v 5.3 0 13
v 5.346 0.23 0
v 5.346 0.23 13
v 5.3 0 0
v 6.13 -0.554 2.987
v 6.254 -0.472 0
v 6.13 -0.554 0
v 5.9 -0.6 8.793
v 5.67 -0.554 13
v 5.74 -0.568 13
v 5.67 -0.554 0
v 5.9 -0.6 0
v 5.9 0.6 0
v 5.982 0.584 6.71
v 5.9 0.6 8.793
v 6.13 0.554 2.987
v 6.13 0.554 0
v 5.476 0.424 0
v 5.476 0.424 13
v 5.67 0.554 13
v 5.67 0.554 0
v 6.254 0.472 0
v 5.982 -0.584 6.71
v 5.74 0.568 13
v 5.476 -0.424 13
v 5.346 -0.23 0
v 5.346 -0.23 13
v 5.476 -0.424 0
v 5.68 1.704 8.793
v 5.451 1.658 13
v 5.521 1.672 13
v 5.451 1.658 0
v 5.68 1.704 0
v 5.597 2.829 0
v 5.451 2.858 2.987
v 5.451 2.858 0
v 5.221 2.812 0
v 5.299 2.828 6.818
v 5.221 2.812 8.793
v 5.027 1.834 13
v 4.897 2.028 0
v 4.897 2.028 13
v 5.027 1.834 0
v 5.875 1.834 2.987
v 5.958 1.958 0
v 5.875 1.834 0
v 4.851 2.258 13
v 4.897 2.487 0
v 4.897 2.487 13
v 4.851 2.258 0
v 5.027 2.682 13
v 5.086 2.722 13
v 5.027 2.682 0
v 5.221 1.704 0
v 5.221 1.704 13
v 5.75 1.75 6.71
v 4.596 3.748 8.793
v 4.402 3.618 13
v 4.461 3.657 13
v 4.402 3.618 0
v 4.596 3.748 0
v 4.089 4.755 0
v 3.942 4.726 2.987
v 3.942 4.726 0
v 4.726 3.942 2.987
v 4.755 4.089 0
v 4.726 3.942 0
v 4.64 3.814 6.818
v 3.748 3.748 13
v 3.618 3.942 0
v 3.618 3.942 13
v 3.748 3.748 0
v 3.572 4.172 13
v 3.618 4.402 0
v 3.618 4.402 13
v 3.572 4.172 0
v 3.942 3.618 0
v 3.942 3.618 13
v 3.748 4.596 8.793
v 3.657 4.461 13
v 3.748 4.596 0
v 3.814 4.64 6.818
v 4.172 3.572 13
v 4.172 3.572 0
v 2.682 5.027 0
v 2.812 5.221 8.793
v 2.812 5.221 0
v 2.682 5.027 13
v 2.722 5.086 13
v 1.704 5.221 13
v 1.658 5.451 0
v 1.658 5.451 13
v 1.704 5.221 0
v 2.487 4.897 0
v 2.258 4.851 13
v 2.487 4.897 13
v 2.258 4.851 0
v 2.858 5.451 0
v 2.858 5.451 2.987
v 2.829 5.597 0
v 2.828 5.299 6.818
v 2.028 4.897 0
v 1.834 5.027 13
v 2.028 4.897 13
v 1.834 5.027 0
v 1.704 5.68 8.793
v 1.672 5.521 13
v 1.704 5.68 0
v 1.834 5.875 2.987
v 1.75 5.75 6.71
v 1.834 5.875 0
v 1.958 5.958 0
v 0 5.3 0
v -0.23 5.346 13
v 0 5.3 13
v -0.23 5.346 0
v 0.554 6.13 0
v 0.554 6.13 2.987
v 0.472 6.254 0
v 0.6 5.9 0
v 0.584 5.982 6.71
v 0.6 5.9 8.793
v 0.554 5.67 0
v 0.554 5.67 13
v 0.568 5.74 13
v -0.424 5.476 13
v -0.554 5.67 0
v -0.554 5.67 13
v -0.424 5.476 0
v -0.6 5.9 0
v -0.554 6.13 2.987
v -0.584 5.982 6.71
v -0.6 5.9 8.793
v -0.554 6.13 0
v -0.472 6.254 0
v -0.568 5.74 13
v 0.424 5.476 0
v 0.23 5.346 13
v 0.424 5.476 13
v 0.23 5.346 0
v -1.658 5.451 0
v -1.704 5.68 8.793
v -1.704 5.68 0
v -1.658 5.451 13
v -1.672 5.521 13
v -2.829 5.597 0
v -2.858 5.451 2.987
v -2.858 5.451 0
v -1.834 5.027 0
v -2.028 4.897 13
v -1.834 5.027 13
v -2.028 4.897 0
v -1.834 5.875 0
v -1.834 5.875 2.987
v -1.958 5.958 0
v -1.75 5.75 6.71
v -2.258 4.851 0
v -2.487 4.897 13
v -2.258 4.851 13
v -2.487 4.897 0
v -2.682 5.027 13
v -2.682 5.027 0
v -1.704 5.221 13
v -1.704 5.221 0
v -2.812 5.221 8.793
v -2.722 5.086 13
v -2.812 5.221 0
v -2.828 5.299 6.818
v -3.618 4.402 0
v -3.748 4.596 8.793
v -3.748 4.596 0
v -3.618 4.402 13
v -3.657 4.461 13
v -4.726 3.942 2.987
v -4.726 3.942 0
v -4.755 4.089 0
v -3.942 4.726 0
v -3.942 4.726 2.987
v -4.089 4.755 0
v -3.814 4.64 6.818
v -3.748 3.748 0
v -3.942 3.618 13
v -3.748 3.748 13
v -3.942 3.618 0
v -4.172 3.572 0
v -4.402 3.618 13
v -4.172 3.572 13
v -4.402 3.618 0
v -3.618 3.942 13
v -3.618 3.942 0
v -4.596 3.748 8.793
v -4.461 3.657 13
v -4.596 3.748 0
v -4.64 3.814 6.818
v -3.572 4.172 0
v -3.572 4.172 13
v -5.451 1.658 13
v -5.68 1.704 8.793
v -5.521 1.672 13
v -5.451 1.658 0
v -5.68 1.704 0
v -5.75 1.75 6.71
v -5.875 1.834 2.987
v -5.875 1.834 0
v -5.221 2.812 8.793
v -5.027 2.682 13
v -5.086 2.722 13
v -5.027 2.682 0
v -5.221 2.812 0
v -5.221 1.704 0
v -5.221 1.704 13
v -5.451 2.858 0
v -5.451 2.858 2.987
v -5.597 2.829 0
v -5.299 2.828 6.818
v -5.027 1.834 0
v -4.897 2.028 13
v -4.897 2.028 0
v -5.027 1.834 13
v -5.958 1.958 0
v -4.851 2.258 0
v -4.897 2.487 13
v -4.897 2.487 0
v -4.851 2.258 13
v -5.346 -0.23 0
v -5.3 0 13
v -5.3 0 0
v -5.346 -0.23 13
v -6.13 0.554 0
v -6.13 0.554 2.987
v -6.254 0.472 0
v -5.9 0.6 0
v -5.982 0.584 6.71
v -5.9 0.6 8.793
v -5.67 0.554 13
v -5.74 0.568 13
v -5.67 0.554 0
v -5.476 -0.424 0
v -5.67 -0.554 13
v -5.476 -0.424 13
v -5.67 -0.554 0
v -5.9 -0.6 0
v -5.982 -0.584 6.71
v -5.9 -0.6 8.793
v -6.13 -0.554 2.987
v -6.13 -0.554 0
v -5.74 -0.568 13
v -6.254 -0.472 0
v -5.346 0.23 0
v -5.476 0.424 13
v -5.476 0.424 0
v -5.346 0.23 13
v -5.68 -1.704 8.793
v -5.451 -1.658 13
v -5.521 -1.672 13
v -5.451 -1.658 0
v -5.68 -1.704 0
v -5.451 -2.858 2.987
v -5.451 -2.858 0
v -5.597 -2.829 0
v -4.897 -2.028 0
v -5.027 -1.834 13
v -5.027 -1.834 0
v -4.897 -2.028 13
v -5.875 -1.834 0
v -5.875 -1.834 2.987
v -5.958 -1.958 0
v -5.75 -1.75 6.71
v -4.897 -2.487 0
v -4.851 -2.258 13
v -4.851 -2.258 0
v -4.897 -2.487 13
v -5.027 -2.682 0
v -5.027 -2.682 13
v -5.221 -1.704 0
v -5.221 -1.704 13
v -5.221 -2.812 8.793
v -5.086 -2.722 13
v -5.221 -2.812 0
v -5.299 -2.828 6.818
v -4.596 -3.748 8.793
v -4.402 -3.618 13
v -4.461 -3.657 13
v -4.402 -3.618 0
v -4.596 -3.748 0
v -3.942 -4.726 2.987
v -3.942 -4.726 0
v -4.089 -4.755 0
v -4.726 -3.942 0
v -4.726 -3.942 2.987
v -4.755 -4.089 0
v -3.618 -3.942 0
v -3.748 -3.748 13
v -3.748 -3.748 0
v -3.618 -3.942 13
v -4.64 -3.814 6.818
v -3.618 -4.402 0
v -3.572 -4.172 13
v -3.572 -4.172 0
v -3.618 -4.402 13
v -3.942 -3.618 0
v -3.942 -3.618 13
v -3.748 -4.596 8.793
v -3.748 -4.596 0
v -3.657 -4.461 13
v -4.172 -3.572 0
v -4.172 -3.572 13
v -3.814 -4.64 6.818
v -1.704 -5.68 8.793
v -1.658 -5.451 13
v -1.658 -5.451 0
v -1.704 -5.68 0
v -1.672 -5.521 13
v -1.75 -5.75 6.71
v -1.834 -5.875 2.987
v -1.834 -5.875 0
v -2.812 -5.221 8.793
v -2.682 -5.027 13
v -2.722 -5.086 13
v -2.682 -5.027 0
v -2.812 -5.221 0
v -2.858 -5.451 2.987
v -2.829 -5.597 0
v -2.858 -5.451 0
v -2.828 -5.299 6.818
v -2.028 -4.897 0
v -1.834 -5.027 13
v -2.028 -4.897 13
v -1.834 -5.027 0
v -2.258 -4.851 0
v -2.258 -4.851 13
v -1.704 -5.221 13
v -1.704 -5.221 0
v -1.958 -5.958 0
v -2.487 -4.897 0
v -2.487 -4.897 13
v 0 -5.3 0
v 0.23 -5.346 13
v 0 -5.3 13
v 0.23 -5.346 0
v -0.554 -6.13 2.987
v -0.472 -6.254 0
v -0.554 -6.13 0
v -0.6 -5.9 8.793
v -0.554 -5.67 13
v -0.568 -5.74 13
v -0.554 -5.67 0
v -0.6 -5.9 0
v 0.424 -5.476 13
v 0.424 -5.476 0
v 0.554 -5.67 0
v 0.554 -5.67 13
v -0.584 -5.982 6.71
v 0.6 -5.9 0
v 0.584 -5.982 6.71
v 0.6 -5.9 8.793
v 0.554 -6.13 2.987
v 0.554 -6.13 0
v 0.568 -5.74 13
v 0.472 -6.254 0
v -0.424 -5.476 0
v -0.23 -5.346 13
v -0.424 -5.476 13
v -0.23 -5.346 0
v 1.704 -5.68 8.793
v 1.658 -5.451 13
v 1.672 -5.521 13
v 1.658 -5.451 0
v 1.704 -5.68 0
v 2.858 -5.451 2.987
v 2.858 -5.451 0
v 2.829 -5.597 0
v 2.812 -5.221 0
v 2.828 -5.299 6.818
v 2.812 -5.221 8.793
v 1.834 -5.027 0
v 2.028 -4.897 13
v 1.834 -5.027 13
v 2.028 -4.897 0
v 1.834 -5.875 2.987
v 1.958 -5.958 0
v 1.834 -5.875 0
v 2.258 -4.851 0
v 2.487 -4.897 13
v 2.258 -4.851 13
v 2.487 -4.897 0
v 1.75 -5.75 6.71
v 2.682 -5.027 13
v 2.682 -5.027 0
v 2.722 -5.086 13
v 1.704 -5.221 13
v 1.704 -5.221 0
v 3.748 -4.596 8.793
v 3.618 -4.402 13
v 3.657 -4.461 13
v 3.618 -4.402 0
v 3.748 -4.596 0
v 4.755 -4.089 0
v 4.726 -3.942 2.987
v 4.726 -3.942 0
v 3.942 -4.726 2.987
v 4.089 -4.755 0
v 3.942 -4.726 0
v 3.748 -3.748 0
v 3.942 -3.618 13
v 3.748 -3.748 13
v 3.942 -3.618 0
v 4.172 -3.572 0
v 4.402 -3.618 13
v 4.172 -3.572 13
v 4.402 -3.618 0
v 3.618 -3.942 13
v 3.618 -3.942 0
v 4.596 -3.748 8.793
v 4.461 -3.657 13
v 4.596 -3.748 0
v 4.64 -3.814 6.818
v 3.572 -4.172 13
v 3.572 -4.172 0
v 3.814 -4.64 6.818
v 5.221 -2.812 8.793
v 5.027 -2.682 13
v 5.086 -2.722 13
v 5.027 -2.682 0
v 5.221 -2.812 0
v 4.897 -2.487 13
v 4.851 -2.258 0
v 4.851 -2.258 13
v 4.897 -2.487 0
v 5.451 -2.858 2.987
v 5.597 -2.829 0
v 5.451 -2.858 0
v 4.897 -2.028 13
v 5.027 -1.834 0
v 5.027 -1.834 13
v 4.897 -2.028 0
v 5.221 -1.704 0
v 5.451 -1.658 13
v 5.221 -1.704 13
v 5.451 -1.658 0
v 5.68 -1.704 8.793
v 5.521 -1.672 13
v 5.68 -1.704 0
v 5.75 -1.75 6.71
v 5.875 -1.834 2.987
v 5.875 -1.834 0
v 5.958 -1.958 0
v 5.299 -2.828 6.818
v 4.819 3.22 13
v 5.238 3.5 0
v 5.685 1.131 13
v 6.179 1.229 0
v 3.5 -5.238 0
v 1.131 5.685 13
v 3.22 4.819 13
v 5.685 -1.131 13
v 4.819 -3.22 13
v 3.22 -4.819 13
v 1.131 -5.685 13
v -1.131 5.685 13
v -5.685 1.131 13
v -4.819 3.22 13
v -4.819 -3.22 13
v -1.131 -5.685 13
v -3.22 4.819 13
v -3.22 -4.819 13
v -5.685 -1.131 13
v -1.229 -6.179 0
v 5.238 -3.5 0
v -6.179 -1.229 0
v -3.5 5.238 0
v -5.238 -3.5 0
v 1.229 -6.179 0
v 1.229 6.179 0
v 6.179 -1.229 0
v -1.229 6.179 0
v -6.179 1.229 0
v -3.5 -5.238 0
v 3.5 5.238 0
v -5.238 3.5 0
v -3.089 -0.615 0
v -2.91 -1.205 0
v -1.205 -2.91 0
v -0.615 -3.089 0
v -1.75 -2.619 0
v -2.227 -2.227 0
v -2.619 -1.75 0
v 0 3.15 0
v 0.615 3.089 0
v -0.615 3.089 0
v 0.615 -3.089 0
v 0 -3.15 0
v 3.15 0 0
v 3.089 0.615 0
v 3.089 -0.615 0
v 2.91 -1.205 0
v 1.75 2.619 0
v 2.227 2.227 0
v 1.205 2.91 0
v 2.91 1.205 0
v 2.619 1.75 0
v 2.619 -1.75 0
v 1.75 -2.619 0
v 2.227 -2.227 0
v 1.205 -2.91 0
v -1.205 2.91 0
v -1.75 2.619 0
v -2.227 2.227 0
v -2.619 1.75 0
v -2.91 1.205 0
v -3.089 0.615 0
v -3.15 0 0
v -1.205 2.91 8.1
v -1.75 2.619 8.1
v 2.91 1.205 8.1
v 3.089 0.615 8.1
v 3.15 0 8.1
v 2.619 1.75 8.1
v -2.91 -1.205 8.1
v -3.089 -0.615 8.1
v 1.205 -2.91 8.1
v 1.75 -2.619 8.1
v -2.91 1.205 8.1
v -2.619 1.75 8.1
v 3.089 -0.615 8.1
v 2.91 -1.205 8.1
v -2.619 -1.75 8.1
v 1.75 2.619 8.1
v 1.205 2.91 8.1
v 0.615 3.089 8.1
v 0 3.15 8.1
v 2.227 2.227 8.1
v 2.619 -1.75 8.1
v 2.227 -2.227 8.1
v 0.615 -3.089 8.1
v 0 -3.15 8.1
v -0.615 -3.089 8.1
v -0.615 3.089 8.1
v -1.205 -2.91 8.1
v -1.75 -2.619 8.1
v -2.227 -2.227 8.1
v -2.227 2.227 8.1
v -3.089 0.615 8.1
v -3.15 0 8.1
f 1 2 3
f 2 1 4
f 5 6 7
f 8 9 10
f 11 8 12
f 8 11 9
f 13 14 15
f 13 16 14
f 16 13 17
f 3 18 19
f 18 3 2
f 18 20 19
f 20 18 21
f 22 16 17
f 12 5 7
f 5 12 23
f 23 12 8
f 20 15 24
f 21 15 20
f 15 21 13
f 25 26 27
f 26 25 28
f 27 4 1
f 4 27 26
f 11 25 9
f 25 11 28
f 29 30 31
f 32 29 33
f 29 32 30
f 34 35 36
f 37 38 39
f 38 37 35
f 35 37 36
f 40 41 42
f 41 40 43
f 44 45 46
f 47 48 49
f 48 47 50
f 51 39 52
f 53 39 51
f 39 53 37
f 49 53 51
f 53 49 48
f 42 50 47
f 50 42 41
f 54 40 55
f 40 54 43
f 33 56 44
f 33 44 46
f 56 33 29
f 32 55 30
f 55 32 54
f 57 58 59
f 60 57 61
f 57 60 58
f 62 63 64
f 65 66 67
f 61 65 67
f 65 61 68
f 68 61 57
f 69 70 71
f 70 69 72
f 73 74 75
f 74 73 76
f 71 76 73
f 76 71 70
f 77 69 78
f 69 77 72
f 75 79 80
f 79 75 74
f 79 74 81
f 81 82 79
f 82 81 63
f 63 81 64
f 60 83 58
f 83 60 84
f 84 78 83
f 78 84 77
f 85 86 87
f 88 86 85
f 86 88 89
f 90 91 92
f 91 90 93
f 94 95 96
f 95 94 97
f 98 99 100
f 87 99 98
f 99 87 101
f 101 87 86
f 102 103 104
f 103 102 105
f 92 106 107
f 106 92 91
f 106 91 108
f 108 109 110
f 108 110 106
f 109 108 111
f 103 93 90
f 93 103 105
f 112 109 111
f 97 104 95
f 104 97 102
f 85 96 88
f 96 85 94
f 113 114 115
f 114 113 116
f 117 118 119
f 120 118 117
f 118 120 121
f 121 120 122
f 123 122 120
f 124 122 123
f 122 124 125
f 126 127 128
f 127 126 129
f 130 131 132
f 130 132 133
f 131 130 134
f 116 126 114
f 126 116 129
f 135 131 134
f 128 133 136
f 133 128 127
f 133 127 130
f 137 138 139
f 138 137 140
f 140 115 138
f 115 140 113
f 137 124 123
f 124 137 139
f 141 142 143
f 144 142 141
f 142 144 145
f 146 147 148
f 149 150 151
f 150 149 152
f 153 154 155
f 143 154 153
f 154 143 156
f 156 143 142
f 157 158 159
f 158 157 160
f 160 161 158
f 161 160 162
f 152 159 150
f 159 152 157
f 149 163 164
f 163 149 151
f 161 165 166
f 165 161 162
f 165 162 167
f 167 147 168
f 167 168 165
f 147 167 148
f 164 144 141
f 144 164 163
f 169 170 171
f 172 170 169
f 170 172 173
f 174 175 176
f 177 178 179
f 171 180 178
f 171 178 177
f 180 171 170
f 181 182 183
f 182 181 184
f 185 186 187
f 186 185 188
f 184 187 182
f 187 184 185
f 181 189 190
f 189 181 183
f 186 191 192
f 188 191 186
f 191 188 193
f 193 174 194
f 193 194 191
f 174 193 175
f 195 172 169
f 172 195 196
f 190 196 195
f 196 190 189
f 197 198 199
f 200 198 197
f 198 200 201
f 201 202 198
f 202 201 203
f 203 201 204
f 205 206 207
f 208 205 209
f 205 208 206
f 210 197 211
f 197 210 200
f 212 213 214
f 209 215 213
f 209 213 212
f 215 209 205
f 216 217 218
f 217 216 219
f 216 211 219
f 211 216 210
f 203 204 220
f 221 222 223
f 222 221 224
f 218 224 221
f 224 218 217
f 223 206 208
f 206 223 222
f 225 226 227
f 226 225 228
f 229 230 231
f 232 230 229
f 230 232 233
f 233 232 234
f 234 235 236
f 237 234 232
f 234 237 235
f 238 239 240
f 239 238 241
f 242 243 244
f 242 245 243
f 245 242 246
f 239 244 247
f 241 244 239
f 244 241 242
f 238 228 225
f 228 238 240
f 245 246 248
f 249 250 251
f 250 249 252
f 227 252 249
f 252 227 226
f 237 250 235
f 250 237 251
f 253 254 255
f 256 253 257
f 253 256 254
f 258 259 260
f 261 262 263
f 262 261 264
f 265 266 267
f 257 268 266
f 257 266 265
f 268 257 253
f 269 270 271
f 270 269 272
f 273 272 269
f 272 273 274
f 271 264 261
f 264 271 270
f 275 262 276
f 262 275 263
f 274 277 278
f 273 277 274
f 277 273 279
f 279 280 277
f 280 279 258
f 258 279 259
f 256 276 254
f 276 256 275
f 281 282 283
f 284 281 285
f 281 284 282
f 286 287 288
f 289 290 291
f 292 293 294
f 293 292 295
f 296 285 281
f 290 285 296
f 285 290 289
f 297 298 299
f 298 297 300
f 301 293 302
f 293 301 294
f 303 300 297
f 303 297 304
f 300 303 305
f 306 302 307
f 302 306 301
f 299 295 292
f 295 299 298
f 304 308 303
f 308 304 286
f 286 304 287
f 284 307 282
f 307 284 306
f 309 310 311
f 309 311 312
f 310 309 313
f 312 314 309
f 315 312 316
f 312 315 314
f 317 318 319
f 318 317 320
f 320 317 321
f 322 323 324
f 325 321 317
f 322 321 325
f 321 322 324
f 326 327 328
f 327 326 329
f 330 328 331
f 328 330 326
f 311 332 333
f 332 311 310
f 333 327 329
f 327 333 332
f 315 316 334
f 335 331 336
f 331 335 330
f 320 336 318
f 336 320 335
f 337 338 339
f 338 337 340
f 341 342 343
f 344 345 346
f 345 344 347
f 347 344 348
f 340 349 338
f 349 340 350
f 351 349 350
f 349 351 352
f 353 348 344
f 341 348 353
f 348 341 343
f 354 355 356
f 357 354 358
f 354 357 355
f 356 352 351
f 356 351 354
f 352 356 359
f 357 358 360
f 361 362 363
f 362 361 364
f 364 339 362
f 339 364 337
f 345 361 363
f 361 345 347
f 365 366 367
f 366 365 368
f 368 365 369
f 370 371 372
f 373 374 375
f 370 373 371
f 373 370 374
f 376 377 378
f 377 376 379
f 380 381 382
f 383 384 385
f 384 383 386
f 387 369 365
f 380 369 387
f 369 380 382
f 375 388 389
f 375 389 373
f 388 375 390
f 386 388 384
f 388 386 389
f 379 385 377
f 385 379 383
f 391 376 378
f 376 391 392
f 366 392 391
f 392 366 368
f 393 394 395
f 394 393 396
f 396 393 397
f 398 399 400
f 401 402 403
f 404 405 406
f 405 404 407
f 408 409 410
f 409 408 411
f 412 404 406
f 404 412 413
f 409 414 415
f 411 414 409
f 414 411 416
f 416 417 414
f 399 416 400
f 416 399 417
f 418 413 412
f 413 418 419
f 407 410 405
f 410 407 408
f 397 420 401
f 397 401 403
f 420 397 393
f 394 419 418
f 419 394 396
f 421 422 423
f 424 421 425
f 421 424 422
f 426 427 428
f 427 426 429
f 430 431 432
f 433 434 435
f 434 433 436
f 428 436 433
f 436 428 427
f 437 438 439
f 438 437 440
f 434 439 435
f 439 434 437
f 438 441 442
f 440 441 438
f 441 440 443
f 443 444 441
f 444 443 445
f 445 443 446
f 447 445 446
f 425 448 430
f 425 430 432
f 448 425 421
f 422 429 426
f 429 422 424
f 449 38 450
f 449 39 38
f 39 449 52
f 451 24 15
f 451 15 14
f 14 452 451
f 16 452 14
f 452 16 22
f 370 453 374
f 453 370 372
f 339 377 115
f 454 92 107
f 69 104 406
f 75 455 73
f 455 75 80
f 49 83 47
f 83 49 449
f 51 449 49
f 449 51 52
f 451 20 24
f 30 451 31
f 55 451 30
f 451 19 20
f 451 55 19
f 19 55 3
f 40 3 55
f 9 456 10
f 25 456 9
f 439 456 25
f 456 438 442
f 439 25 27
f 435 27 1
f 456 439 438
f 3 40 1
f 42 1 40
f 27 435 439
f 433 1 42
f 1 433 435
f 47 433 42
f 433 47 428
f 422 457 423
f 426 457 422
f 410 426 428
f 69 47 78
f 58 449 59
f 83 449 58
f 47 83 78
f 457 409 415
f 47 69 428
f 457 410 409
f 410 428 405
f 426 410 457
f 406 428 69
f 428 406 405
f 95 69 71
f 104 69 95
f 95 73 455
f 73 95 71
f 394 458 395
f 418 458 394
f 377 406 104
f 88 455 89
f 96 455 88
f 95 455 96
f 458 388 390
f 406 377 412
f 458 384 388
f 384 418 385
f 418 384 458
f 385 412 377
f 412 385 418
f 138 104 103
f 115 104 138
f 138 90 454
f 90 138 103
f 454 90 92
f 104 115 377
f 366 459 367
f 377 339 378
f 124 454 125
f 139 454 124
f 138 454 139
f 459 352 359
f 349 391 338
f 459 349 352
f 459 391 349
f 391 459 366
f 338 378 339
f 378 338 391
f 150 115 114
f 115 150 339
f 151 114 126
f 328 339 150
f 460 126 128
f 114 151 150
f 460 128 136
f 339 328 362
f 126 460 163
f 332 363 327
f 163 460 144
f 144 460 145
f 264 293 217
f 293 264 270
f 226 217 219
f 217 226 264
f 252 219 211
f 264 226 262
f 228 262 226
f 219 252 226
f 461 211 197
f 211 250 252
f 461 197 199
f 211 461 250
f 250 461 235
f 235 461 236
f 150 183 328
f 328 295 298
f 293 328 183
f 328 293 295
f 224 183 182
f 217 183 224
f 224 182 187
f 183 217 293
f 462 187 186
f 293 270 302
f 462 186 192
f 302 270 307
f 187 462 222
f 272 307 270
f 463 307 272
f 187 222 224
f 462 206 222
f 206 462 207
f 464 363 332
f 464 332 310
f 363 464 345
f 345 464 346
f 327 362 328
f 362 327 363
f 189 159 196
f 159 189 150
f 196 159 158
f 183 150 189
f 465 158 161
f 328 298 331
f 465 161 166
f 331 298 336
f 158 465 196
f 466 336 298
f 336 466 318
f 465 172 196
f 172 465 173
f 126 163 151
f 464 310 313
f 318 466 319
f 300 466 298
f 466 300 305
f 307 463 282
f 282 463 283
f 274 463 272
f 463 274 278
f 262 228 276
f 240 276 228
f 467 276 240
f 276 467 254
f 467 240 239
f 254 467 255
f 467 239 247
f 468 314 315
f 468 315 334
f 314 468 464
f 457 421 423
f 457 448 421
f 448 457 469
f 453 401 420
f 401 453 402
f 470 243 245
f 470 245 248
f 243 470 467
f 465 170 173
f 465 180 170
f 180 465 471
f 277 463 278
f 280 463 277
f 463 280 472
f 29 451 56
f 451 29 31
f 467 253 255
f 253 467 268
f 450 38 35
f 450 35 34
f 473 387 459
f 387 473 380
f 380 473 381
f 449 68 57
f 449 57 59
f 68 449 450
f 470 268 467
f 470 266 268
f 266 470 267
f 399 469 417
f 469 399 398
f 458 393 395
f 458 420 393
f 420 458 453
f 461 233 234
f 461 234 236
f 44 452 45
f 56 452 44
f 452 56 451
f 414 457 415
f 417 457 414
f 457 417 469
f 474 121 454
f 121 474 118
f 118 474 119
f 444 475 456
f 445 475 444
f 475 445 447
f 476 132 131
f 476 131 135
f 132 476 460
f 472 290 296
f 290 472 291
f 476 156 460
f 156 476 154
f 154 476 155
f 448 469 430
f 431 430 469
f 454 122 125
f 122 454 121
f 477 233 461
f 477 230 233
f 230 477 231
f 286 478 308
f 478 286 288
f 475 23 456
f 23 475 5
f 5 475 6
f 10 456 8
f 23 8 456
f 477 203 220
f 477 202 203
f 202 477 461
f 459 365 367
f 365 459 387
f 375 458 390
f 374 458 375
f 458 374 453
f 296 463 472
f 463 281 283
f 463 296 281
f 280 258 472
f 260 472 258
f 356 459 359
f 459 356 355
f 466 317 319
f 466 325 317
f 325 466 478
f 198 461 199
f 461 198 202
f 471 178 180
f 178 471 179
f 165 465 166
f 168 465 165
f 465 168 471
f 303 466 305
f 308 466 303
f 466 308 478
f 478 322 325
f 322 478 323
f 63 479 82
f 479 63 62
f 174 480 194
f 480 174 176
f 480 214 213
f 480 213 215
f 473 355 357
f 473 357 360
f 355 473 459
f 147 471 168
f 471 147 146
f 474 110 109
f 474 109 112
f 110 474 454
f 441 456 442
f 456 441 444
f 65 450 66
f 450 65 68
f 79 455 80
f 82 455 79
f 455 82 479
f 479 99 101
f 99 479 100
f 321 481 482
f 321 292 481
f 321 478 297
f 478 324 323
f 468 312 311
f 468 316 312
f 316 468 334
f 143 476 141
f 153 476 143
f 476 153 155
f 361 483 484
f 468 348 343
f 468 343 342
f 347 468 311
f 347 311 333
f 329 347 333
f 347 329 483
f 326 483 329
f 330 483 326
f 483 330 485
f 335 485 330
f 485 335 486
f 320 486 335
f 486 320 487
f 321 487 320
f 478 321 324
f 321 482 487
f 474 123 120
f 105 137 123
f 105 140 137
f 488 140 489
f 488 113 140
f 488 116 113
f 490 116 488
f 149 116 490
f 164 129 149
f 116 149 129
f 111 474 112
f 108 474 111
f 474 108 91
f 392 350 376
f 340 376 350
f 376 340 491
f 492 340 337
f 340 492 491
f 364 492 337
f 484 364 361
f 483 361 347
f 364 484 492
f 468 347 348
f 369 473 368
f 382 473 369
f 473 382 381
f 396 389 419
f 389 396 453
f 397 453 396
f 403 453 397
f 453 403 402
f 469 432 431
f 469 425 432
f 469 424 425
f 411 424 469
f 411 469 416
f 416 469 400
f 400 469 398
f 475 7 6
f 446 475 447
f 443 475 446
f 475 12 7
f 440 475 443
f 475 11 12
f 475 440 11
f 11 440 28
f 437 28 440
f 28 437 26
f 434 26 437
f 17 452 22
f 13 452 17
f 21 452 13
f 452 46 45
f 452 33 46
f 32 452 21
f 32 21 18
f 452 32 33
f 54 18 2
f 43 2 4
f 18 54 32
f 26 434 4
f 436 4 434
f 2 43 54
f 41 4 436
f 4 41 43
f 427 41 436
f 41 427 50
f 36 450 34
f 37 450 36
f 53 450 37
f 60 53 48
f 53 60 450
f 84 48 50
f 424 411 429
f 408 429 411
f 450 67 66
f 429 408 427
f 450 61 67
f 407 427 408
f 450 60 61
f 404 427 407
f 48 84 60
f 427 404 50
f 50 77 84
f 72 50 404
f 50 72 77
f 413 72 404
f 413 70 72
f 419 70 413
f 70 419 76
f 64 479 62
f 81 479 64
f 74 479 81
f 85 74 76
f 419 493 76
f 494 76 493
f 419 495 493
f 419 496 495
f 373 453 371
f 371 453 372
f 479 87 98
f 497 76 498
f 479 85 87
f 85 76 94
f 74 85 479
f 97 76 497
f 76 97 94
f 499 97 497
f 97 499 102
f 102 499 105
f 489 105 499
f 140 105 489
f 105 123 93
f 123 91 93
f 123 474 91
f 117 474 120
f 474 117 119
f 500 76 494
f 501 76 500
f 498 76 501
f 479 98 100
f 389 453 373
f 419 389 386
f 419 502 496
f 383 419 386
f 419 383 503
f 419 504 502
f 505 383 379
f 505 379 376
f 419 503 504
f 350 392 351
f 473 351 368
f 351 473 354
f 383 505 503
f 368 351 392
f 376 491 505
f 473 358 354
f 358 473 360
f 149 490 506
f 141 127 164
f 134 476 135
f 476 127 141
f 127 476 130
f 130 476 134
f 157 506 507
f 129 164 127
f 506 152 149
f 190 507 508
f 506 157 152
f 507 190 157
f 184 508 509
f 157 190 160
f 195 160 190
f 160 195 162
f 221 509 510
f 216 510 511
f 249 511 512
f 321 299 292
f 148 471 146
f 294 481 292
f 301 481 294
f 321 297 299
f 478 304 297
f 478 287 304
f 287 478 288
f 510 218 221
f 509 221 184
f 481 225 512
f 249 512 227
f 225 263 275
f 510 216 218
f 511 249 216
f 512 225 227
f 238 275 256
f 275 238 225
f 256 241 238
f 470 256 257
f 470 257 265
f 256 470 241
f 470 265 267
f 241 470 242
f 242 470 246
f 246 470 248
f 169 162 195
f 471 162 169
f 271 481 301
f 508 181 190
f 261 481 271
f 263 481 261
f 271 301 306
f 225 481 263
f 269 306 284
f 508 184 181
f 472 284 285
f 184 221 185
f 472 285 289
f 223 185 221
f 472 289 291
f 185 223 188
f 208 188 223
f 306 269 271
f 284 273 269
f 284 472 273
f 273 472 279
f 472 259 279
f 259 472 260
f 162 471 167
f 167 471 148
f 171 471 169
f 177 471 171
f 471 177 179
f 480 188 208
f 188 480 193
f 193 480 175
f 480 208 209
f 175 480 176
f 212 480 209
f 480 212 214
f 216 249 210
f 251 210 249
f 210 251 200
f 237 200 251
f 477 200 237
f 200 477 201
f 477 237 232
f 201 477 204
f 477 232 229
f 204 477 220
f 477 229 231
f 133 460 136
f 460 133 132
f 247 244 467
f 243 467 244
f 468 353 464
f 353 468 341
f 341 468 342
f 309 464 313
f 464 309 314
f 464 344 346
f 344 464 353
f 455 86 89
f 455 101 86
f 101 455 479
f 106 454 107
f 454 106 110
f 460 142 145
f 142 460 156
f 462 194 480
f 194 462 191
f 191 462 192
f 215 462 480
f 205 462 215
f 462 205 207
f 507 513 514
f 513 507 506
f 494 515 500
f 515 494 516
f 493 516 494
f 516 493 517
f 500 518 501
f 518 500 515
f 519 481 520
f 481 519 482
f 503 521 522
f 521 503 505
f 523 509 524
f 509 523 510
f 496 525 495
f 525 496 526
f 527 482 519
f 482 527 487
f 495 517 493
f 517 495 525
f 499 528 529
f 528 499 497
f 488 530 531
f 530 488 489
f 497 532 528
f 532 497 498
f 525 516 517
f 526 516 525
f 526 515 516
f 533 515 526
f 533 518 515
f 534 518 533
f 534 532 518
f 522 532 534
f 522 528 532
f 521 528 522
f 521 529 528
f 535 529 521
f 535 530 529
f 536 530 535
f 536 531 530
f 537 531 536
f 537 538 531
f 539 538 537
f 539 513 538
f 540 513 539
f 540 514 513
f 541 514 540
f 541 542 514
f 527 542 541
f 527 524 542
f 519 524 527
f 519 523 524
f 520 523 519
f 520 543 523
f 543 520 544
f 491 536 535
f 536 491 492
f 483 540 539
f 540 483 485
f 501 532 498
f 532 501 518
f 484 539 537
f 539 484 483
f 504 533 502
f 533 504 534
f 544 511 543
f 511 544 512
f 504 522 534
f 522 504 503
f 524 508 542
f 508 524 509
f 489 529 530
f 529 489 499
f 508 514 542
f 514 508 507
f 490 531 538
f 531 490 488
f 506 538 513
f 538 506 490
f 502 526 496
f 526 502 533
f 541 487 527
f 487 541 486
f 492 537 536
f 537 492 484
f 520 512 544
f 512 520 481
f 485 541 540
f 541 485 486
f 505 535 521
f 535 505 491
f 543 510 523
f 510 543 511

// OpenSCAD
// ACCESS KNOB — Din Sync RE-303 Parameter Knob
// Generated via CLI for Studio Knobs
module access_knob_re303_param() {
  outer_d = 12.6;
  height = 13;
  taper = 0.92;
  bore_d = 6;
  slot_h = 8;
  tex_depth = 0.8;
  tex_scale = 1.2;
  tex_count = 16;

  difference() {
    cylinder(h=height, d1=outer_d, d2=outer_d*taper, $fn=32);
    translate([0,0,-0.1]) cylinder(h=slot_h+0.2, d=bore_d + 0.3, $fn=32);
    for(i=[0:tex_count-1]) {
      rotate([0,0,i*(360/tex_count)])
        translate([outer_d/2-tex_depth/2, 0, height/2])
          cylinder(h=height*1.1, d=tex_scale, center=true, $fn=16);
    }
  }
}
access_knob_re303_param();
